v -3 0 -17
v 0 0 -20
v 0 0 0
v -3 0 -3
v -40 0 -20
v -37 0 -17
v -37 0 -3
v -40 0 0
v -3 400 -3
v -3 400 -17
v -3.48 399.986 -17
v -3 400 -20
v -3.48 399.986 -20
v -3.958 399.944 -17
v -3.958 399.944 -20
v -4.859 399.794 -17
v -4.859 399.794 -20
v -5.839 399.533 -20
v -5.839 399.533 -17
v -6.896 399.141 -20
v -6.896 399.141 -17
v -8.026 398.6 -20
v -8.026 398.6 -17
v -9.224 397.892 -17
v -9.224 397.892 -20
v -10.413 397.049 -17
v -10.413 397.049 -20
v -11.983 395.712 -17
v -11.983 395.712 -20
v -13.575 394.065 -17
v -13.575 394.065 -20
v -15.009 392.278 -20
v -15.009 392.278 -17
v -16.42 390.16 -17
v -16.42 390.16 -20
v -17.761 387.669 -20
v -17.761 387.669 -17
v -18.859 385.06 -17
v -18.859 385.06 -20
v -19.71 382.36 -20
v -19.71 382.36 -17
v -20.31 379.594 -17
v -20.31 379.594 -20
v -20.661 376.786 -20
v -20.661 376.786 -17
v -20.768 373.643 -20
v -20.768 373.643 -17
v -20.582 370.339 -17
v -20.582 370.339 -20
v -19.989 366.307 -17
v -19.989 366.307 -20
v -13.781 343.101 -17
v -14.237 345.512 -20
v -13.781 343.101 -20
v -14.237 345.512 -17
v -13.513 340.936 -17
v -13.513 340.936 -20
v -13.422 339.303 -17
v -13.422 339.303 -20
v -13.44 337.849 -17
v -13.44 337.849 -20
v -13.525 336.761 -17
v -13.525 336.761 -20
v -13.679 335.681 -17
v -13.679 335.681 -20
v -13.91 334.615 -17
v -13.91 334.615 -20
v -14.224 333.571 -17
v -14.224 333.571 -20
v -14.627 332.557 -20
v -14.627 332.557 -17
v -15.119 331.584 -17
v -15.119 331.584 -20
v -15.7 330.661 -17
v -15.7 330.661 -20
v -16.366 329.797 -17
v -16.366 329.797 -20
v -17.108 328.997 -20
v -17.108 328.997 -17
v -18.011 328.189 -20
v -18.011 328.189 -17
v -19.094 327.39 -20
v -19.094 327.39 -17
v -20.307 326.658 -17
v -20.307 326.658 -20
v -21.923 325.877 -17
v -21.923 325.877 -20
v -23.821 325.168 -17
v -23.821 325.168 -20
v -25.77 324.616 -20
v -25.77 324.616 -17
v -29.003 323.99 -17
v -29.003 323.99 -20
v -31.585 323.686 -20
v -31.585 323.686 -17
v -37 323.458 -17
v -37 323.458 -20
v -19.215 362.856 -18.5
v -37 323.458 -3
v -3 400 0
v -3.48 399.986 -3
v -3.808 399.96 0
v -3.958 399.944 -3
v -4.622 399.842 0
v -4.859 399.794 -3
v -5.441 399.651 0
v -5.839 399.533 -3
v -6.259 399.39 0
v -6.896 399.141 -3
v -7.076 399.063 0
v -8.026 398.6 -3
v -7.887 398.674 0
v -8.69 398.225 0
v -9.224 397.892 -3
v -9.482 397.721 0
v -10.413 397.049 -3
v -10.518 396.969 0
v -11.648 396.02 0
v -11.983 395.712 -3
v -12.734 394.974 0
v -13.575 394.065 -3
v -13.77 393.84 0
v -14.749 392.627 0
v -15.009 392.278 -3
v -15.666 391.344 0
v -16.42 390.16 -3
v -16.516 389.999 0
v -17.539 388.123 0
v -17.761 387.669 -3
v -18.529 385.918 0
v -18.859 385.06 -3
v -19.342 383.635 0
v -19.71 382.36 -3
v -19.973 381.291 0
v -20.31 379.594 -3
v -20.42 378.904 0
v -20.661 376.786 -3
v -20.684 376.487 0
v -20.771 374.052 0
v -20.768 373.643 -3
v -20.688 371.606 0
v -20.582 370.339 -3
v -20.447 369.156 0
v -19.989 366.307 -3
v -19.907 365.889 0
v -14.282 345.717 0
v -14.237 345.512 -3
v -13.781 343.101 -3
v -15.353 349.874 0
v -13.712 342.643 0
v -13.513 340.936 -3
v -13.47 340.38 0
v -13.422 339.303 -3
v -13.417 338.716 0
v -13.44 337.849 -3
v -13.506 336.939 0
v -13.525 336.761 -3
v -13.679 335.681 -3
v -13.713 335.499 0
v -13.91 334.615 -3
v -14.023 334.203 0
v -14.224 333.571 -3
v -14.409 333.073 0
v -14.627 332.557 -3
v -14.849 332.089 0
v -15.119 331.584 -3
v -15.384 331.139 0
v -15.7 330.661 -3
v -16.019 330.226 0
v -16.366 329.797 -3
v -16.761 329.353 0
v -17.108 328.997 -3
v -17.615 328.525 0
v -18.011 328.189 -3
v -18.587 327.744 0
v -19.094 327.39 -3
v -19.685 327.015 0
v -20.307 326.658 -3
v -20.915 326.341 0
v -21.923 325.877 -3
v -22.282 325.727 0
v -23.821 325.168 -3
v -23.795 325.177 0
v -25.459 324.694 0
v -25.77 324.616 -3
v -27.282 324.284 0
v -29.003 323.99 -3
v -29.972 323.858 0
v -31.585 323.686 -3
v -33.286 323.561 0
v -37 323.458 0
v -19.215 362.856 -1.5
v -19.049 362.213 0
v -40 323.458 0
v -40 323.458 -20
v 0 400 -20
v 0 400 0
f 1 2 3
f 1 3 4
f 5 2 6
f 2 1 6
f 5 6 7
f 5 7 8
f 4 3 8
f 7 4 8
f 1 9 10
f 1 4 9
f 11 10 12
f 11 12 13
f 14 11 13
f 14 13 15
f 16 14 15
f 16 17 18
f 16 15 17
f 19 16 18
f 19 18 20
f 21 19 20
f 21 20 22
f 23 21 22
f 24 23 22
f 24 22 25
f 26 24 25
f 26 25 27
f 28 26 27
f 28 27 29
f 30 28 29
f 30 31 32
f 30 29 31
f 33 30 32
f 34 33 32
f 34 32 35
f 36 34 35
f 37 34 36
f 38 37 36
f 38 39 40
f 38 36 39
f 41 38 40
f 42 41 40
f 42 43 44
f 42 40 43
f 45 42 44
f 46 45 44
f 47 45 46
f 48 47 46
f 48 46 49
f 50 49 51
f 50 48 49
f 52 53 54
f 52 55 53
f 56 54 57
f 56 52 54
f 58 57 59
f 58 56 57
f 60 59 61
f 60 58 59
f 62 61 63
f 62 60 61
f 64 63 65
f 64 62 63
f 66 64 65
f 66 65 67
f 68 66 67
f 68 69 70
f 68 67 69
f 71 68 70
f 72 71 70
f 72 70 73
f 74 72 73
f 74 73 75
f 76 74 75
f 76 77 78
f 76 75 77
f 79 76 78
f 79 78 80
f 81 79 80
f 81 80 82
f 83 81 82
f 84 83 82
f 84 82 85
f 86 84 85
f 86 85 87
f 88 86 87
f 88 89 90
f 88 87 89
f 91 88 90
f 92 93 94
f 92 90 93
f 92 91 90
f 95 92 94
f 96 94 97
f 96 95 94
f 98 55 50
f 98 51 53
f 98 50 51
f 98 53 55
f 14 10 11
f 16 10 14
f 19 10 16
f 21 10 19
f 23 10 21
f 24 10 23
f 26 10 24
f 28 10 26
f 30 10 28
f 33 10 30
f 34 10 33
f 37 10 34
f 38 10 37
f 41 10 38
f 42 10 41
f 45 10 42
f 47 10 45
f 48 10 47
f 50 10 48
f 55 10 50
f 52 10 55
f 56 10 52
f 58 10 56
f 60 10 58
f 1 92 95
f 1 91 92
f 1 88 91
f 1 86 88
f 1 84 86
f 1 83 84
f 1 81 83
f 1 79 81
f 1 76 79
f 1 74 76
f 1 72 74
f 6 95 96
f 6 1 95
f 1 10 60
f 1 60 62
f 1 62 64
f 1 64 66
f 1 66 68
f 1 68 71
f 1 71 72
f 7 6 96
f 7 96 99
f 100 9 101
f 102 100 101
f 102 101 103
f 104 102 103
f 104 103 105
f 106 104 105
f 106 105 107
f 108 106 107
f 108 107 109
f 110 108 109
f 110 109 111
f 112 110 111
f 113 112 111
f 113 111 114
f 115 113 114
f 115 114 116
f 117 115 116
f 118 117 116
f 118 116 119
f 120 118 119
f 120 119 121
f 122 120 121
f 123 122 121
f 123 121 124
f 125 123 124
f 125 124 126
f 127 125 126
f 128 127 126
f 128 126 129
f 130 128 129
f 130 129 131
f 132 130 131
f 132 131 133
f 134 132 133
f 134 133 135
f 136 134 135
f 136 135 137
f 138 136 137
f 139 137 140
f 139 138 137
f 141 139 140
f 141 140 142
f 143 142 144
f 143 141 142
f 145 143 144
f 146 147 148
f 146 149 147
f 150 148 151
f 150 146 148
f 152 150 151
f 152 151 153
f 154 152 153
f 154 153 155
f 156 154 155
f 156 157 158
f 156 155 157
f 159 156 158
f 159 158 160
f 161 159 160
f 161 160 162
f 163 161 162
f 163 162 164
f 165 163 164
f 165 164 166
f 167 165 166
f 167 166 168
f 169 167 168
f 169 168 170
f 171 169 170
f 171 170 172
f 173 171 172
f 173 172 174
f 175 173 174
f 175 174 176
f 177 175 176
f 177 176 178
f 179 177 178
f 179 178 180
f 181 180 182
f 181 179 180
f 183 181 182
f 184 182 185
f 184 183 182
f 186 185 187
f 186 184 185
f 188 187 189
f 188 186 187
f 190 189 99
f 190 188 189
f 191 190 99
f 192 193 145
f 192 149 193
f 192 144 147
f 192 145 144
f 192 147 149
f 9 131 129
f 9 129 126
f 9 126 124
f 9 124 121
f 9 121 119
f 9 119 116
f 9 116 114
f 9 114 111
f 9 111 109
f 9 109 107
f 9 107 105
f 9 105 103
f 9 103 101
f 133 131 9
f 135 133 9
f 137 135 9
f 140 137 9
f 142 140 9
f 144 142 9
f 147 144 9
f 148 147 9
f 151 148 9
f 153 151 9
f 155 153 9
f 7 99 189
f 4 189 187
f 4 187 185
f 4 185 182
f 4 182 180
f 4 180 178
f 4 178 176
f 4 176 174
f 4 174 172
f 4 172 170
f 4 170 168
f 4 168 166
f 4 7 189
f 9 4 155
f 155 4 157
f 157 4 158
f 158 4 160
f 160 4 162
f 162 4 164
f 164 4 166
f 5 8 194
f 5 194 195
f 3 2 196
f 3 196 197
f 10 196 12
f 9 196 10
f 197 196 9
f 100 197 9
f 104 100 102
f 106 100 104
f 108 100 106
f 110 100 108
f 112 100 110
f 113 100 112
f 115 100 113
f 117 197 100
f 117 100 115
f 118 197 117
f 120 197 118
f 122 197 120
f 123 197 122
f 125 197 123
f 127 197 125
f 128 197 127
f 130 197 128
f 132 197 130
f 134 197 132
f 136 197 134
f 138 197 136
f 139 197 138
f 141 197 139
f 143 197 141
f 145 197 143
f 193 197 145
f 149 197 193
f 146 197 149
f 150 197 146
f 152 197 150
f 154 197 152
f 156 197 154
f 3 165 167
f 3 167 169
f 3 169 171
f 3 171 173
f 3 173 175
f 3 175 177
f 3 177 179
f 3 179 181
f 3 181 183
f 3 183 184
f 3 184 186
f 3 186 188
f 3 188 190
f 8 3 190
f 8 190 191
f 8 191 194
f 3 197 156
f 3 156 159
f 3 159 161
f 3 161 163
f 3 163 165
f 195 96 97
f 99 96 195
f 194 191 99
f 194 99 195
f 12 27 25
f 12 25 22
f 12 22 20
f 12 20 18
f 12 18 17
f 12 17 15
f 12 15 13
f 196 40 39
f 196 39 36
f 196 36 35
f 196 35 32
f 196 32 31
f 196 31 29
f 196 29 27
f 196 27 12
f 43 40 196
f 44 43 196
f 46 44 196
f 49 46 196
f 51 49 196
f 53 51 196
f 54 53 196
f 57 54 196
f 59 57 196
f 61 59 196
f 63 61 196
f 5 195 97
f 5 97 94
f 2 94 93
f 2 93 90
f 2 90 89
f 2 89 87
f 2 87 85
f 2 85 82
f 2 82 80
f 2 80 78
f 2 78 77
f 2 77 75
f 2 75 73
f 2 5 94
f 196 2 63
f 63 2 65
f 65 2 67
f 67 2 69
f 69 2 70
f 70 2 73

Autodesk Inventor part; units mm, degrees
ref_plane "YZ Plane" through (0, 0, 0) normal (1, 0, 0) x (0, 1, 0)
ref_plane "XZ Plane" through (0, 0, 0) normal (0, 1, 0) x (-1, 0, 0)
ref_plane "XY Plane" through (0, 0, 0) normal (0, 0, 1) x (1, 0, 0)
sketch "Эскиз1" plane through (0, 0, 0) normal (0, 1, 0) x (-1, 0, 0)
  line L0 (0, 0) -> (40, 0)
  line L1 (40, 0) -> (40, -20)
  line L2 (40, -20) -> (0, -20)
  line L3 (0, -20) -> (0, 0)
  line L4 (37, -3) -> (3, -3)
  line L5 (3, -3) -> (3, -17)
  line L6 (3, -17) -> (37, -17)
  line L7 (37, -17) -> (37, -3)
  dimension "d0" = 20
  dimension "d1" = 40
  dimension "d2" = 3
extrude "Выдавливание1" add sketch "Эскиз1" along normal blind 400
sketch "Эскиз2" plane through (-40, 0, 0) normal (0, 0, 1) x (1, 0, 0)
  line L0 (3, 0) -> (3, 400) projected
  line L1 (0, 400) -> (40, 400) projected
  line L2 (20, 819.3664) -> (20, 691.613)
  line L3 (3, 0) -> (37, 0) projected
  line L4 (37, 0) -> (37, 400) projected
  line L5 (3, 400) -> (37, 400) projected
  line L6 (3, 0) -> (3, 400) projected
  line L7 (37, 0) -> (37, 400) projected
  spline S0 degree 4 poles (37, 400) (28.1429, 400) (6.6723, 373.0542) (29.5104, 351.5723) (31.0092, 323.4583) (3, 323.4583) knots 0 0 0 0 0 0.490634 1 1 1 1 1
  line L8 (22.2784, 323.4583) -> (-16.2784, 323.4583) construction
  arc A0 (-12.0901, 325.0339) -> (18.0901, 325.0339) centre (3, 396.5064) ccw construction
  line L9 (44.0036, 400) -> (29.9964, 400) construction
  arc A1 (41.5725, 398.5449) -> (32.4275, 398.5449) centre (37, 392.0879) ccw construction
  line L10 (3, 323.4583) -> (0, 323.4583)
  line L11 (0, 0) -> (0, 400) projected
  line L12 (0, 323.4583) -> (0, 400)
  point P0 (40, 0)
  point P1 (20, 381.1712)
  point P2 (25.6195, 346.1519)
extrude "Выдавливание2" cut sketch "Эскиз2" against normal through all contours L10 L11 L1 L0 | L0 L1 S0
equation "\"d0\" = width_profile_tibea"
equation "\"d1\" = hight_profile_tibea"
equation "\"d2\" = thickness_profile_tibea"
equation "\"d3\" = length_thorn_tibia"
equation "\"d_main_shaft\" = 15"
equation "\"width_profile_tibea\" = 20"
equation "\"hight_profile_tibea\" = 40"
equation "\"thickness_profile_tibea\" = 3"
equation "\"tolerance_plazma\" = 0.1"
equation "\"d_main_screw_holes\" = 6.1"
equation "\"length_thorn_tibia\" = 400"
equation "\"thickness_steel\" = 3"
equation "\"hight_shaft_shift\" = 37"
equation "\"thickness_profile_femur\" = 3"
equation "\"width_shaft_shift\" = 35"
equation "\"width_flattened_surface\" = 12"
properties part number "tibea_profile" material "Алюминий"
